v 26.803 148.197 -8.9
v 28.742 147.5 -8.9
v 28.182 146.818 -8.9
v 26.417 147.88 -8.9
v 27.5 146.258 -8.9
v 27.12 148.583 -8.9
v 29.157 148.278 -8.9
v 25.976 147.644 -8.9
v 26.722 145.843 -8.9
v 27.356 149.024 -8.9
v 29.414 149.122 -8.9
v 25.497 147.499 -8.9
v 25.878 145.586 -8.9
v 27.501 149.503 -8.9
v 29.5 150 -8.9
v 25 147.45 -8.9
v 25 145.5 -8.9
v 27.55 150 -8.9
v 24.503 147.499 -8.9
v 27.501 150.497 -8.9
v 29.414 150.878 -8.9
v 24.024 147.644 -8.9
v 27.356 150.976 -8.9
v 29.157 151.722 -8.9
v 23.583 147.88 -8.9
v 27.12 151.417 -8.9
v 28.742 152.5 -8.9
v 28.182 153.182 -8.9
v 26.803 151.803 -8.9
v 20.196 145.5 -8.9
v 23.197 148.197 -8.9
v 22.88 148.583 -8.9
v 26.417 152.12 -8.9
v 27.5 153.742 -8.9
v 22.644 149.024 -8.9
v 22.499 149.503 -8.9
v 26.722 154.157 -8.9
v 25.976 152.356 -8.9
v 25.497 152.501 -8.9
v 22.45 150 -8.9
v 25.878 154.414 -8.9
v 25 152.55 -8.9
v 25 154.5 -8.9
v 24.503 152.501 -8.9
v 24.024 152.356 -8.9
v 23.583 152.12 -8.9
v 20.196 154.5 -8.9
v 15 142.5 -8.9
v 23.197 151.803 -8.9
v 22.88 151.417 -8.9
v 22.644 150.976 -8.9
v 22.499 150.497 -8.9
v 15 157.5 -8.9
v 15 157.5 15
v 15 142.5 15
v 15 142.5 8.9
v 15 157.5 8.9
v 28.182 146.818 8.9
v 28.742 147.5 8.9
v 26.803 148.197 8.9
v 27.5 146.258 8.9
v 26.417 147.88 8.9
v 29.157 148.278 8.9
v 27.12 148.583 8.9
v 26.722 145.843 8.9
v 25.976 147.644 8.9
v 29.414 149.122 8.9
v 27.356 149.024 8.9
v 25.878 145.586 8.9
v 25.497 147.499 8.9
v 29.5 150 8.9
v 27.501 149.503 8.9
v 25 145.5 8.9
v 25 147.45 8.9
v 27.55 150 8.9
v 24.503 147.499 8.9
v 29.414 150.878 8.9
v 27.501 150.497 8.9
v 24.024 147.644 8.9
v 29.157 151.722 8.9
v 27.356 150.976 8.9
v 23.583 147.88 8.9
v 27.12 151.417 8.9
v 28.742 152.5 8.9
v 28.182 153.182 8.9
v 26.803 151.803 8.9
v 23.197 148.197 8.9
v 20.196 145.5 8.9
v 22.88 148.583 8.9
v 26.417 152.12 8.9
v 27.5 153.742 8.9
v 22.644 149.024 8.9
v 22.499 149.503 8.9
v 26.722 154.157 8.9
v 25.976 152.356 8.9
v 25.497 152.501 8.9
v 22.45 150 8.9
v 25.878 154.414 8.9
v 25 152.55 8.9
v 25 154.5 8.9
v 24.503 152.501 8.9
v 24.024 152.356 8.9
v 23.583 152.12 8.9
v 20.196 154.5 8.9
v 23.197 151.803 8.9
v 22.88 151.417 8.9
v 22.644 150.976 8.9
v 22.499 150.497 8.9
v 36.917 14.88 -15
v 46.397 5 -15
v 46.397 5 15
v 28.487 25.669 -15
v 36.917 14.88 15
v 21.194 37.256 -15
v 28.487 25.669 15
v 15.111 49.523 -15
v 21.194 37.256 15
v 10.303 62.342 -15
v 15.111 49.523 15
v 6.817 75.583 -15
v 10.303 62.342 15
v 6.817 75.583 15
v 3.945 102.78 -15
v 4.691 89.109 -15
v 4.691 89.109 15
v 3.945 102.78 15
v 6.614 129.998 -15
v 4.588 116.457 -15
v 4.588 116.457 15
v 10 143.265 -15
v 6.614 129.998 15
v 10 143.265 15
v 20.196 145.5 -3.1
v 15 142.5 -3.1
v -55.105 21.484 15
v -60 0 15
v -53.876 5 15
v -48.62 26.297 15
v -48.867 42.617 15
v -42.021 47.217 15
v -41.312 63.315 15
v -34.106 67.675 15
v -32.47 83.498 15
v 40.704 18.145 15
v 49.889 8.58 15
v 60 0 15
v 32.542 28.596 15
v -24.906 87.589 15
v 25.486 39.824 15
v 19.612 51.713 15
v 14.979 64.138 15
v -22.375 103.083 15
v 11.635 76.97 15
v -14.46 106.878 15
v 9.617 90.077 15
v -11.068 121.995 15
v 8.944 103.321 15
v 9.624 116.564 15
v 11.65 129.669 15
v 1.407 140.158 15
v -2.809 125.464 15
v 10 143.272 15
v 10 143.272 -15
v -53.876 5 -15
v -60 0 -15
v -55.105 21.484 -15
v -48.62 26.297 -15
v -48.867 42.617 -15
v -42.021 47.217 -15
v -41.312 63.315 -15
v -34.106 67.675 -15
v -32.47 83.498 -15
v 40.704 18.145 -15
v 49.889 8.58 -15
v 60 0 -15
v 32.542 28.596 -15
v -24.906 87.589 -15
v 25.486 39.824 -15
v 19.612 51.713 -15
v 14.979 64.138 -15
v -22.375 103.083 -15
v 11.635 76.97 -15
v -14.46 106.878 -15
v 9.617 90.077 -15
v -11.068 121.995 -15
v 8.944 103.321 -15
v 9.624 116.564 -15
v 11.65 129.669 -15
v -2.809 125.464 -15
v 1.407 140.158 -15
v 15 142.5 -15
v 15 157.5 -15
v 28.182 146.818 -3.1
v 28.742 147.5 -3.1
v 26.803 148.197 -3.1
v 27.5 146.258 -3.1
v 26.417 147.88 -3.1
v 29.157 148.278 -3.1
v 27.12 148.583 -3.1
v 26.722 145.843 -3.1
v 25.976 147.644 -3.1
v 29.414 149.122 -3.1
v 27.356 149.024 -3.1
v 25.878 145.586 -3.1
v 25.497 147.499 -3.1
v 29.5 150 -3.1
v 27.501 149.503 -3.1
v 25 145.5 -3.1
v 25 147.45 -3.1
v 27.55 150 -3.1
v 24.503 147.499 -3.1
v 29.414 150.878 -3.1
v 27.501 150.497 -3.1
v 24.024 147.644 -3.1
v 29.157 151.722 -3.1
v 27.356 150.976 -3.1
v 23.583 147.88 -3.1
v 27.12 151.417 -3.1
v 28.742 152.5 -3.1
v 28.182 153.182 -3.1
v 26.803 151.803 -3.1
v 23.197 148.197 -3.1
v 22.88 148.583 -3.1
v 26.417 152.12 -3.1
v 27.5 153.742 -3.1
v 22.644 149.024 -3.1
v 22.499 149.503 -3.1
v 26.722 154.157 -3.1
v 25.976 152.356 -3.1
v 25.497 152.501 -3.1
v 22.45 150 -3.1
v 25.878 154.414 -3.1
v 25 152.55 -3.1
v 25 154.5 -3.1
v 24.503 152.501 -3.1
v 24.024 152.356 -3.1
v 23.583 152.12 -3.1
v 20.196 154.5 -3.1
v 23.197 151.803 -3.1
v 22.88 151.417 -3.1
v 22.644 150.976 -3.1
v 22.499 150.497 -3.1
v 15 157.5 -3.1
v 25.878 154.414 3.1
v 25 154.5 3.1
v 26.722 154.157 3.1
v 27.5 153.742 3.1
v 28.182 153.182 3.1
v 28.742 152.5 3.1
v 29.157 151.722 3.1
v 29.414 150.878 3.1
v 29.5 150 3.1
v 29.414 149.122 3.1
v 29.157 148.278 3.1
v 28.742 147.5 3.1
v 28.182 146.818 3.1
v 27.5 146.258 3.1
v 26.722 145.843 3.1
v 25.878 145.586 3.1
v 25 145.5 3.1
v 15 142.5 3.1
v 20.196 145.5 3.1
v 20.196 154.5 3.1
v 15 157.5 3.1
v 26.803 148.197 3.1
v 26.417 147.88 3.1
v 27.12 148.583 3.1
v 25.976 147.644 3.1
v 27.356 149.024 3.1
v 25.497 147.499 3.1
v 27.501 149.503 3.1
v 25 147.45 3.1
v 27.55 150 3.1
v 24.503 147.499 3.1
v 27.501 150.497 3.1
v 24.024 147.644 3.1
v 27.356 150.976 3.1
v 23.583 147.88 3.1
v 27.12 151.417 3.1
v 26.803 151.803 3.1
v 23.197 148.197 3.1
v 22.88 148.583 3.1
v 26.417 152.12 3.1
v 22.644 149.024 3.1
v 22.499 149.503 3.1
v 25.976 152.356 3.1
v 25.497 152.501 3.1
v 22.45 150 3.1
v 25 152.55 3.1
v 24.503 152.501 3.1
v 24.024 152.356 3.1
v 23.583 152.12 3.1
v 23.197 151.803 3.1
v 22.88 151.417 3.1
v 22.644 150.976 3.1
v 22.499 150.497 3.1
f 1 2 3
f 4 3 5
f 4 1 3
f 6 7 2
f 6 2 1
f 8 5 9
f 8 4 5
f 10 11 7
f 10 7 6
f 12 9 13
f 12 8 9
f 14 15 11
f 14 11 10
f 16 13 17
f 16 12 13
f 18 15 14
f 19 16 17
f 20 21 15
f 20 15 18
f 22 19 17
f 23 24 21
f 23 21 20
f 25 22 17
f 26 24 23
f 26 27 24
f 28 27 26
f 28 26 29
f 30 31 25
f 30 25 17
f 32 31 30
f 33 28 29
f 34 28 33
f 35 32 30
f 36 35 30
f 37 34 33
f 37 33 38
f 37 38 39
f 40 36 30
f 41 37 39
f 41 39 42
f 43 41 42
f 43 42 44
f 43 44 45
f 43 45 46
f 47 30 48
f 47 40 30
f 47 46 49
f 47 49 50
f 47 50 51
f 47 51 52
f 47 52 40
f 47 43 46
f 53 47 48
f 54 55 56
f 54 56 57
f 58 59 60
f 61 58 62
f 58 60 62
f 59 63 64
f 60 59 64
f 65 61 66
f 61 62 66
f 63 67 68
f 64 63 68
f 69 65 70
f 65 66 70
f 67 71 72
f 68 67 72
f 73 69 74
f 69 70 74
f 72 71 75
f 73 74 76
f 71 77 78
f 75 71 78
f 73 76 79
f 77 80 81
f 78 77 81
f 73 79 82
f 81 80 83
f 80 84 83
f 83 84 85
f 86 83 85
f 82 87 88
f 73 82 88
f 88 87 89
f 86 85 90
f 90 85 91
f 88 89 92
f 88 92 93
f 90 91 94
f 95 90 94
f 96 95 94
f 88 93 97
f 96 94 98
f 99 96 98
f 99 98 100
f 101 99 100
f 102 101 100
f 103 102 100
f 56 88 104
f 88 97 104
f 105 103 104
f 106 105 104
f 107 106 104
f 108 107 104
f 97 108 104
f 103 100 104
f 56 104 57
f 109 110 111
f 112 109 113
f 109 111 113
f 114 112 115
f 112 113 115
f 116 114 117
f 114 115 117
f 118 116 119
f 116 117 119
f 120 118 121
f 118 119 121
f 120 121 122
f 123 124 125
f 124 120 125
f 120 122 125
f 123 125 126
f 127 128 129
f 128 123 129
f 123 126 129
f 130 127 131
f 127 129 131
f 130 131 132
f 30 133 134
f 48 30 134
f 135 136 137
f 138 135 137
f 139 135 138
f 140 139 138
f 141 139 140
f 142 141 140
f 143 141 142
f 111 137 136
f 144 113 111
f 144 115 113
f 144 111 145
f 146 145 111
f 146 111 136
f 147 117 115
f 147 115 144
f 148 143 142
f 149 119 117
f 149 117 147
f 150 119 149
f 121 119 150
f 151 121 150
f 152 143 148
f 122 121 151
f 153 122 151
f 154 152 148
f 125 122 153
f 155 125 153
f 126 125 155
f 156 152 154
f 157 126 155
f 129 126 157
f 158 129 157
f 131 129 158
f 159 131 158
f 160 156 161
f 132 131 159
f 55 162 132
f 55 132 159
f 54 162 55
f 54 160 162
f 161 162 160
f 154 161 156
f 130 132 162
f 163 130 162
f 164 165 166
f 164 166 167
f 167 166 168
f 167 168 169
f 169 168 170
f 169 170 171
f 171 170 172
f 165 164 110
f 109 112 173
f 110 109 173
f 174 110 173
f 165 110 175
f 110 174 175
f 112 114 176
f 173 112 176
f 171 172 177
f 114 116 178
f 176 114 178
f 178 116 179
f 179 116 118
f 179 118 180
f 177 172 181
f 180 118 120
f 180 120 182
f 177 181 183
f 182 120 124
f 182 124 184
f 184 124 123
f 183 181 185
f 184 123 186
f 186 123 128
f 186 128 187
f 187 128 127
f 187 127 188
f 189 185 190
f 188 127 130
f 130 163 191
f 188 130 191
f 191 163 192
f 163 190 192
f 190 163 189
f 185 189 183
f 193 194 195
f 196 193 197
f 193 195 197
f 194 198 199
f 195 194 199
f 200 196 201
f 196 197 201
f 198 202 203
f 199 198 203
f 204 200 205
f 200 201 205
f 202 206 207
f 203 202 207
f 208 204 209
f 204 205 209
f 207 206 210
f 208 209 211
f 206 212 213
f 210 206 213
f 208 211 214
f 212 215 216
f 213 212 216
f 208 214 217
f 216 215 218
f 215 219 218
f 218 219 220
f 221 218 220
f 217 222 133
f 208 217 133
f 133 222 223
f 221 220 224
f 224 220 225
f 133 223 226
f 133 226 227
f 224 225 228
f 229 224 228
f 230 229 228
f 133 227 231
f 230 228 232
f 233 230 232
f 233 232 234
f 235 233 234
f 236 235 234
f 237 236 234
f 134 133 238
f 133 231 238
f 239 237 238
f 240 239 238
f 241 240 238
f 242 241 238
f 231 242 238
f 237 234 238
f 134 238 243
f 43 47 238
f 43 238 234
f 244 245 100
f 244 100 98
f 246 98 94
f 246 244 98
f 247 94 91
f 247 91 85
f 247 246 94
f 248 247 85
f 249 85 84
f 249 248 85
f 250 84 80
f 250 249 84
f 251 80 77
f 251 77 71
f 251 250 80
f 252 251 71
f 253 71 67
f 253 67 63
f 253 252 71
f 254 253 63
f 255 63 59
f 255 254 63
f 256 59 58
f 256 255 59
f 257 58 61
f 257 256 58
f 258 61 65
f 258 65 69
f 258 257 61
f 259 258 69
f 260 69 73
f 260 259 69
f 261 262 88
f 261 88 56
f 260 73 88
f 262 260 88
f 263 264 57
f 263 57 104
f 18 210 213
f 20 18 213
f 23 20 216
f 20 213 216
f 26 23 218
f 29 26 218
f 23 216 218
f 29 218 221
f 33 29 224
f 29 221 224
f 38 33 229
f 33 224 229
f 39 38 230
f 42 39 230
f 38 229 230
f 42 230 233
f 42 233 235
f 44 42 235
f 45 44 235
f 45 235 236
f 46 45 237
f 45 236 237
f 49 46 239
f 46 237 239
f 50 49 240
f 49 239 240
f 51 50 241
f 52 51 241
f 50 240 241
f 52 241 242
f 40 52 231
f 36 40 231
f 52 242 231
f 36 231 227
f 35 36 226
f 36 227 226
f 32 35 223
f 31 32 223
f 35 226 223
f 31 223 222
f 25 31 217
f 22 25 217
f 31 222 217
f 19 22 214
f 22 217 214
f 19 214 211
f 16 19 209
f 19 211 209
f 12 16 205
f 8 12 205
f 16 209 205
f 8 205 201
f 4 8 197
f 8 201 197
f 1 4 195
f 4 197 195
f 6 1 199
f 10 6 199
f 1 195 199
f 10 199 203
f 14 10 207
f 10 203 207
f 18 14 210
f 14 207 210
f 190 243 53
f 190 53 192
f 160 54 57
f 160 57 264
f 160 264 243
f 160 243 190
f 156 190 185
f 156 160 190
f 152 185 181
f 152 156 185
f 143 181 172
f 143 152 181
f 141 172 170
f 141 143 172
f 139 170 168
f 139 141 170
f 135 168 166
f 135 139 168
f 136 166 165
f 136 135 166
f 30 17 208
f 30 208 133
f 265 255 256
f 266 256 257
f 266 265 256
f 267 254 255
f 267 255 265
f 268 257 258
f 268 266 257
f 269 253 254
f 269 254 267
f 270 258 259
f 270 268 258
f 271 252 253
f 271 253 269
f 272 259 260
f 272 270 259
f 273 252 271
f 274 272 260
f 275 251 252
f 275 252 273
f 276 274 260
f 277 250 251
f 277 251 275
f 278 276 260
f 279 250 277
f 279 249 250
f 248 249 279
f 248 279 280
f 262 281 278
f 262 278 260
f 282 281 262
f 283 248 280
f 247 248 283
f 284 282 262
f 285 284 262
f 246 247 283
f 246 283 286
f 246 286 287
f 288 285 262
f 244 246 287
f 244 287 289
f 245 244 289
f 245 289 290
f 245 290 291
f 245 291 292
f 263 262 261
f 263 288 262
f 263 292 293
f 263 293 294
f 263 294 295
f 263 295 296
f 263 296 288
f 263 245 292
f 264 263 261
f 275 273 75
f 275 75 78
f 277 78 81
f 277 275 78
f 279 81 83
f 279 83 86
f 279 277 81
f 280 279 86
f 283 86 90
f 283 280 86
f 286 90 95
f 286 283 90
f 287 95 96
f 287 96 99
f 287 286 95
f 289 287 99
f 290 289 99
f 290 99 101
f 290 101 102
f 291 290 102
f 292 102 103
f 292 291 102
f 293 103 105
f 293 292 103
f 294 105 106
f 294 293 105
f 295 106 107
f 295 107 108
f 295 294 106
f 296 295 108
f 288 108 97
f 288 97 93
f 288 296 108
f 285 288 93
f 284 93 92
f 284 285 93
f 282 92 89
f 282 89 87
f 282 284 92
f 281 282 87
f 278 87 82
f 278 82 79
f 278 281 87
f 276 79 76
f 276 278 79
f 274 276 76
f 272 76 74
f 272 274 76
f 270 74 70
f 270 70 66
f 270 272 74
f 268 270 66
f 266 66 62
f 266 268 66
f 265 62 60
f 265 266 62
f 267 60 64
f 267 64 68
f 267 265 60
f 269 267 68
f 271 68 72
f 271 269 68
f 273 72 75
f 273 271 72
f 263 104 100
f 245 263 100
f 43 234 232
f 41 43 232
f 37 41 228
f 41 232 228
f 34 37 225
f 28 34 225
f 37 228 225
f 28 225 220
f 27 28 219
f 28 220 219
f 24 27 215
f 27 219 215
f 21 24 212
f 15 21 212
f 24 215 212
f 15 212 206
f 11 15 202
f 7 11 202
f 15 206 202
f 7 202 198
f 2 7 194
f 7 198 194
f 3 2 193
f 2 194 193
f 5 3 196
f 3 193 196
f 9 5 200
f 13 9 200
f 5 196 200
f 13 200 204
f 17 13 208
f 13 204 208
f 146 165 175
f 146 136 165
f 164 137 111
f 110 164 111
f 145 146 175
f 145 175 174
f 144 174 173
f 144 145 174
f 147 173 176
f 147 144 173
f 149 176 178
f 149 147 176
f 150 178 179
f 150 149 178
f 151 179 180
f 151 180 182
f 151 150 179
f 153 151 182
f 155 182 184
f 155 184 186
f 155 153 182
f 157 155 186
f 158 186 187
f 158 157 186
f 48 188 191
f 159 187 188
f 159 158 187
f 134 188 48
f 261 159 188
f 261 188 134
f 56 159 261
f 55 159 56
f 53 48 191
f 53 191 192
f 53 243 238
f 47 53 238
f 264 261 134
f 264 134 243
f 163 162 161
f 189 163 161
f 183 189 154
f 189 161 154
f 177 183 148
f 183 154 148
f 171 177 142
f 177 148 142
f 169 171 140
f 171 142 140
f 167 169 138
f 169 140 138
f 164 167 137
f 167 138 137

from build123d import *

# Parameters (mm, degrees)
BOSS_EXTRUDE1_DEPTH = 15
CUT_EXTRUDE1_DEPTH  = 172.190683158
BOSS_EXTRUDE2_START = 3.1
SKETCH4_R           = 2.55
BOSS_EXTRUDE2_DEPTH = 5.8


with BuildPart() as part:
    # Sketch1 → Boss-Extrude1 (new, symmetric)
    with BuildSketch(Plane.XY):
        with BuildLine():
            Line((-60, 0), (60, 0))
            ThreePointArc((60, 0), (14.978542663, 64.137960841), (15, 142.5))
            Line((15, 142.5), (15, 157.5))
            ThreePointArc((15, 157.5), (-32.469836355, 83.497541122), (-60, 0))
        make_face()
    extrude(amount=BOSS_EXTRUDE1_DEPTH, both=True)

    # Sketch3 → Cut-Extrude1 (cut, through all)
    with BuildSketch(Plane.XY.offset(15)):
        with BuildLine():
            Line((10, 143.26466224), (10, 143.272073771))
            ThreePointArc((10, 143.272073771), (-29.664180918, 77.705142353), (-53.876409624, 5))
            Line((-53.876409624, 5), (46.39672745, 5))
            ThreePointArc((46.39672745, 5), (8.391850624, 68.918473527), (10, 143.26466224))
        make_face()
    extrude(amount=-CUT_EXTRUDE1_DEPTH, mode=Mode.SUBTRACT)

    # Sketch4 → Boss-Extrude2 (add)
    with BuildSketch(Plane.XY.offset(BOSS_EXTRUDE2_START)):
        with BuildLine():
            Line((25, 145.5), (20.196152423, 145.5))
            Line((20.196152423, 145.5), (15, 142.5))
            Line((15, 142.5), (15, 157.5))
            Line((15, 157.5), (20.196152423, 154.5))
            Line((20.196152423, 154.5), (25, 154.5))
            ThreePointArc((25, 154.5), (29.5, 150), (25, 145.5))
        make_face()
        with Locations((25, 150)):
            Circle(SKETCH4_R, mode=Mode.SUBTRACT)
    boss_extrude2 = extrude(amount=BOSS_EXTRUDE2_DEPTH)

    # Mirror1: Boss-Extrude2 across plane
    add(boss_extrude2.mirror(Plane.XY))


solid = part.part
